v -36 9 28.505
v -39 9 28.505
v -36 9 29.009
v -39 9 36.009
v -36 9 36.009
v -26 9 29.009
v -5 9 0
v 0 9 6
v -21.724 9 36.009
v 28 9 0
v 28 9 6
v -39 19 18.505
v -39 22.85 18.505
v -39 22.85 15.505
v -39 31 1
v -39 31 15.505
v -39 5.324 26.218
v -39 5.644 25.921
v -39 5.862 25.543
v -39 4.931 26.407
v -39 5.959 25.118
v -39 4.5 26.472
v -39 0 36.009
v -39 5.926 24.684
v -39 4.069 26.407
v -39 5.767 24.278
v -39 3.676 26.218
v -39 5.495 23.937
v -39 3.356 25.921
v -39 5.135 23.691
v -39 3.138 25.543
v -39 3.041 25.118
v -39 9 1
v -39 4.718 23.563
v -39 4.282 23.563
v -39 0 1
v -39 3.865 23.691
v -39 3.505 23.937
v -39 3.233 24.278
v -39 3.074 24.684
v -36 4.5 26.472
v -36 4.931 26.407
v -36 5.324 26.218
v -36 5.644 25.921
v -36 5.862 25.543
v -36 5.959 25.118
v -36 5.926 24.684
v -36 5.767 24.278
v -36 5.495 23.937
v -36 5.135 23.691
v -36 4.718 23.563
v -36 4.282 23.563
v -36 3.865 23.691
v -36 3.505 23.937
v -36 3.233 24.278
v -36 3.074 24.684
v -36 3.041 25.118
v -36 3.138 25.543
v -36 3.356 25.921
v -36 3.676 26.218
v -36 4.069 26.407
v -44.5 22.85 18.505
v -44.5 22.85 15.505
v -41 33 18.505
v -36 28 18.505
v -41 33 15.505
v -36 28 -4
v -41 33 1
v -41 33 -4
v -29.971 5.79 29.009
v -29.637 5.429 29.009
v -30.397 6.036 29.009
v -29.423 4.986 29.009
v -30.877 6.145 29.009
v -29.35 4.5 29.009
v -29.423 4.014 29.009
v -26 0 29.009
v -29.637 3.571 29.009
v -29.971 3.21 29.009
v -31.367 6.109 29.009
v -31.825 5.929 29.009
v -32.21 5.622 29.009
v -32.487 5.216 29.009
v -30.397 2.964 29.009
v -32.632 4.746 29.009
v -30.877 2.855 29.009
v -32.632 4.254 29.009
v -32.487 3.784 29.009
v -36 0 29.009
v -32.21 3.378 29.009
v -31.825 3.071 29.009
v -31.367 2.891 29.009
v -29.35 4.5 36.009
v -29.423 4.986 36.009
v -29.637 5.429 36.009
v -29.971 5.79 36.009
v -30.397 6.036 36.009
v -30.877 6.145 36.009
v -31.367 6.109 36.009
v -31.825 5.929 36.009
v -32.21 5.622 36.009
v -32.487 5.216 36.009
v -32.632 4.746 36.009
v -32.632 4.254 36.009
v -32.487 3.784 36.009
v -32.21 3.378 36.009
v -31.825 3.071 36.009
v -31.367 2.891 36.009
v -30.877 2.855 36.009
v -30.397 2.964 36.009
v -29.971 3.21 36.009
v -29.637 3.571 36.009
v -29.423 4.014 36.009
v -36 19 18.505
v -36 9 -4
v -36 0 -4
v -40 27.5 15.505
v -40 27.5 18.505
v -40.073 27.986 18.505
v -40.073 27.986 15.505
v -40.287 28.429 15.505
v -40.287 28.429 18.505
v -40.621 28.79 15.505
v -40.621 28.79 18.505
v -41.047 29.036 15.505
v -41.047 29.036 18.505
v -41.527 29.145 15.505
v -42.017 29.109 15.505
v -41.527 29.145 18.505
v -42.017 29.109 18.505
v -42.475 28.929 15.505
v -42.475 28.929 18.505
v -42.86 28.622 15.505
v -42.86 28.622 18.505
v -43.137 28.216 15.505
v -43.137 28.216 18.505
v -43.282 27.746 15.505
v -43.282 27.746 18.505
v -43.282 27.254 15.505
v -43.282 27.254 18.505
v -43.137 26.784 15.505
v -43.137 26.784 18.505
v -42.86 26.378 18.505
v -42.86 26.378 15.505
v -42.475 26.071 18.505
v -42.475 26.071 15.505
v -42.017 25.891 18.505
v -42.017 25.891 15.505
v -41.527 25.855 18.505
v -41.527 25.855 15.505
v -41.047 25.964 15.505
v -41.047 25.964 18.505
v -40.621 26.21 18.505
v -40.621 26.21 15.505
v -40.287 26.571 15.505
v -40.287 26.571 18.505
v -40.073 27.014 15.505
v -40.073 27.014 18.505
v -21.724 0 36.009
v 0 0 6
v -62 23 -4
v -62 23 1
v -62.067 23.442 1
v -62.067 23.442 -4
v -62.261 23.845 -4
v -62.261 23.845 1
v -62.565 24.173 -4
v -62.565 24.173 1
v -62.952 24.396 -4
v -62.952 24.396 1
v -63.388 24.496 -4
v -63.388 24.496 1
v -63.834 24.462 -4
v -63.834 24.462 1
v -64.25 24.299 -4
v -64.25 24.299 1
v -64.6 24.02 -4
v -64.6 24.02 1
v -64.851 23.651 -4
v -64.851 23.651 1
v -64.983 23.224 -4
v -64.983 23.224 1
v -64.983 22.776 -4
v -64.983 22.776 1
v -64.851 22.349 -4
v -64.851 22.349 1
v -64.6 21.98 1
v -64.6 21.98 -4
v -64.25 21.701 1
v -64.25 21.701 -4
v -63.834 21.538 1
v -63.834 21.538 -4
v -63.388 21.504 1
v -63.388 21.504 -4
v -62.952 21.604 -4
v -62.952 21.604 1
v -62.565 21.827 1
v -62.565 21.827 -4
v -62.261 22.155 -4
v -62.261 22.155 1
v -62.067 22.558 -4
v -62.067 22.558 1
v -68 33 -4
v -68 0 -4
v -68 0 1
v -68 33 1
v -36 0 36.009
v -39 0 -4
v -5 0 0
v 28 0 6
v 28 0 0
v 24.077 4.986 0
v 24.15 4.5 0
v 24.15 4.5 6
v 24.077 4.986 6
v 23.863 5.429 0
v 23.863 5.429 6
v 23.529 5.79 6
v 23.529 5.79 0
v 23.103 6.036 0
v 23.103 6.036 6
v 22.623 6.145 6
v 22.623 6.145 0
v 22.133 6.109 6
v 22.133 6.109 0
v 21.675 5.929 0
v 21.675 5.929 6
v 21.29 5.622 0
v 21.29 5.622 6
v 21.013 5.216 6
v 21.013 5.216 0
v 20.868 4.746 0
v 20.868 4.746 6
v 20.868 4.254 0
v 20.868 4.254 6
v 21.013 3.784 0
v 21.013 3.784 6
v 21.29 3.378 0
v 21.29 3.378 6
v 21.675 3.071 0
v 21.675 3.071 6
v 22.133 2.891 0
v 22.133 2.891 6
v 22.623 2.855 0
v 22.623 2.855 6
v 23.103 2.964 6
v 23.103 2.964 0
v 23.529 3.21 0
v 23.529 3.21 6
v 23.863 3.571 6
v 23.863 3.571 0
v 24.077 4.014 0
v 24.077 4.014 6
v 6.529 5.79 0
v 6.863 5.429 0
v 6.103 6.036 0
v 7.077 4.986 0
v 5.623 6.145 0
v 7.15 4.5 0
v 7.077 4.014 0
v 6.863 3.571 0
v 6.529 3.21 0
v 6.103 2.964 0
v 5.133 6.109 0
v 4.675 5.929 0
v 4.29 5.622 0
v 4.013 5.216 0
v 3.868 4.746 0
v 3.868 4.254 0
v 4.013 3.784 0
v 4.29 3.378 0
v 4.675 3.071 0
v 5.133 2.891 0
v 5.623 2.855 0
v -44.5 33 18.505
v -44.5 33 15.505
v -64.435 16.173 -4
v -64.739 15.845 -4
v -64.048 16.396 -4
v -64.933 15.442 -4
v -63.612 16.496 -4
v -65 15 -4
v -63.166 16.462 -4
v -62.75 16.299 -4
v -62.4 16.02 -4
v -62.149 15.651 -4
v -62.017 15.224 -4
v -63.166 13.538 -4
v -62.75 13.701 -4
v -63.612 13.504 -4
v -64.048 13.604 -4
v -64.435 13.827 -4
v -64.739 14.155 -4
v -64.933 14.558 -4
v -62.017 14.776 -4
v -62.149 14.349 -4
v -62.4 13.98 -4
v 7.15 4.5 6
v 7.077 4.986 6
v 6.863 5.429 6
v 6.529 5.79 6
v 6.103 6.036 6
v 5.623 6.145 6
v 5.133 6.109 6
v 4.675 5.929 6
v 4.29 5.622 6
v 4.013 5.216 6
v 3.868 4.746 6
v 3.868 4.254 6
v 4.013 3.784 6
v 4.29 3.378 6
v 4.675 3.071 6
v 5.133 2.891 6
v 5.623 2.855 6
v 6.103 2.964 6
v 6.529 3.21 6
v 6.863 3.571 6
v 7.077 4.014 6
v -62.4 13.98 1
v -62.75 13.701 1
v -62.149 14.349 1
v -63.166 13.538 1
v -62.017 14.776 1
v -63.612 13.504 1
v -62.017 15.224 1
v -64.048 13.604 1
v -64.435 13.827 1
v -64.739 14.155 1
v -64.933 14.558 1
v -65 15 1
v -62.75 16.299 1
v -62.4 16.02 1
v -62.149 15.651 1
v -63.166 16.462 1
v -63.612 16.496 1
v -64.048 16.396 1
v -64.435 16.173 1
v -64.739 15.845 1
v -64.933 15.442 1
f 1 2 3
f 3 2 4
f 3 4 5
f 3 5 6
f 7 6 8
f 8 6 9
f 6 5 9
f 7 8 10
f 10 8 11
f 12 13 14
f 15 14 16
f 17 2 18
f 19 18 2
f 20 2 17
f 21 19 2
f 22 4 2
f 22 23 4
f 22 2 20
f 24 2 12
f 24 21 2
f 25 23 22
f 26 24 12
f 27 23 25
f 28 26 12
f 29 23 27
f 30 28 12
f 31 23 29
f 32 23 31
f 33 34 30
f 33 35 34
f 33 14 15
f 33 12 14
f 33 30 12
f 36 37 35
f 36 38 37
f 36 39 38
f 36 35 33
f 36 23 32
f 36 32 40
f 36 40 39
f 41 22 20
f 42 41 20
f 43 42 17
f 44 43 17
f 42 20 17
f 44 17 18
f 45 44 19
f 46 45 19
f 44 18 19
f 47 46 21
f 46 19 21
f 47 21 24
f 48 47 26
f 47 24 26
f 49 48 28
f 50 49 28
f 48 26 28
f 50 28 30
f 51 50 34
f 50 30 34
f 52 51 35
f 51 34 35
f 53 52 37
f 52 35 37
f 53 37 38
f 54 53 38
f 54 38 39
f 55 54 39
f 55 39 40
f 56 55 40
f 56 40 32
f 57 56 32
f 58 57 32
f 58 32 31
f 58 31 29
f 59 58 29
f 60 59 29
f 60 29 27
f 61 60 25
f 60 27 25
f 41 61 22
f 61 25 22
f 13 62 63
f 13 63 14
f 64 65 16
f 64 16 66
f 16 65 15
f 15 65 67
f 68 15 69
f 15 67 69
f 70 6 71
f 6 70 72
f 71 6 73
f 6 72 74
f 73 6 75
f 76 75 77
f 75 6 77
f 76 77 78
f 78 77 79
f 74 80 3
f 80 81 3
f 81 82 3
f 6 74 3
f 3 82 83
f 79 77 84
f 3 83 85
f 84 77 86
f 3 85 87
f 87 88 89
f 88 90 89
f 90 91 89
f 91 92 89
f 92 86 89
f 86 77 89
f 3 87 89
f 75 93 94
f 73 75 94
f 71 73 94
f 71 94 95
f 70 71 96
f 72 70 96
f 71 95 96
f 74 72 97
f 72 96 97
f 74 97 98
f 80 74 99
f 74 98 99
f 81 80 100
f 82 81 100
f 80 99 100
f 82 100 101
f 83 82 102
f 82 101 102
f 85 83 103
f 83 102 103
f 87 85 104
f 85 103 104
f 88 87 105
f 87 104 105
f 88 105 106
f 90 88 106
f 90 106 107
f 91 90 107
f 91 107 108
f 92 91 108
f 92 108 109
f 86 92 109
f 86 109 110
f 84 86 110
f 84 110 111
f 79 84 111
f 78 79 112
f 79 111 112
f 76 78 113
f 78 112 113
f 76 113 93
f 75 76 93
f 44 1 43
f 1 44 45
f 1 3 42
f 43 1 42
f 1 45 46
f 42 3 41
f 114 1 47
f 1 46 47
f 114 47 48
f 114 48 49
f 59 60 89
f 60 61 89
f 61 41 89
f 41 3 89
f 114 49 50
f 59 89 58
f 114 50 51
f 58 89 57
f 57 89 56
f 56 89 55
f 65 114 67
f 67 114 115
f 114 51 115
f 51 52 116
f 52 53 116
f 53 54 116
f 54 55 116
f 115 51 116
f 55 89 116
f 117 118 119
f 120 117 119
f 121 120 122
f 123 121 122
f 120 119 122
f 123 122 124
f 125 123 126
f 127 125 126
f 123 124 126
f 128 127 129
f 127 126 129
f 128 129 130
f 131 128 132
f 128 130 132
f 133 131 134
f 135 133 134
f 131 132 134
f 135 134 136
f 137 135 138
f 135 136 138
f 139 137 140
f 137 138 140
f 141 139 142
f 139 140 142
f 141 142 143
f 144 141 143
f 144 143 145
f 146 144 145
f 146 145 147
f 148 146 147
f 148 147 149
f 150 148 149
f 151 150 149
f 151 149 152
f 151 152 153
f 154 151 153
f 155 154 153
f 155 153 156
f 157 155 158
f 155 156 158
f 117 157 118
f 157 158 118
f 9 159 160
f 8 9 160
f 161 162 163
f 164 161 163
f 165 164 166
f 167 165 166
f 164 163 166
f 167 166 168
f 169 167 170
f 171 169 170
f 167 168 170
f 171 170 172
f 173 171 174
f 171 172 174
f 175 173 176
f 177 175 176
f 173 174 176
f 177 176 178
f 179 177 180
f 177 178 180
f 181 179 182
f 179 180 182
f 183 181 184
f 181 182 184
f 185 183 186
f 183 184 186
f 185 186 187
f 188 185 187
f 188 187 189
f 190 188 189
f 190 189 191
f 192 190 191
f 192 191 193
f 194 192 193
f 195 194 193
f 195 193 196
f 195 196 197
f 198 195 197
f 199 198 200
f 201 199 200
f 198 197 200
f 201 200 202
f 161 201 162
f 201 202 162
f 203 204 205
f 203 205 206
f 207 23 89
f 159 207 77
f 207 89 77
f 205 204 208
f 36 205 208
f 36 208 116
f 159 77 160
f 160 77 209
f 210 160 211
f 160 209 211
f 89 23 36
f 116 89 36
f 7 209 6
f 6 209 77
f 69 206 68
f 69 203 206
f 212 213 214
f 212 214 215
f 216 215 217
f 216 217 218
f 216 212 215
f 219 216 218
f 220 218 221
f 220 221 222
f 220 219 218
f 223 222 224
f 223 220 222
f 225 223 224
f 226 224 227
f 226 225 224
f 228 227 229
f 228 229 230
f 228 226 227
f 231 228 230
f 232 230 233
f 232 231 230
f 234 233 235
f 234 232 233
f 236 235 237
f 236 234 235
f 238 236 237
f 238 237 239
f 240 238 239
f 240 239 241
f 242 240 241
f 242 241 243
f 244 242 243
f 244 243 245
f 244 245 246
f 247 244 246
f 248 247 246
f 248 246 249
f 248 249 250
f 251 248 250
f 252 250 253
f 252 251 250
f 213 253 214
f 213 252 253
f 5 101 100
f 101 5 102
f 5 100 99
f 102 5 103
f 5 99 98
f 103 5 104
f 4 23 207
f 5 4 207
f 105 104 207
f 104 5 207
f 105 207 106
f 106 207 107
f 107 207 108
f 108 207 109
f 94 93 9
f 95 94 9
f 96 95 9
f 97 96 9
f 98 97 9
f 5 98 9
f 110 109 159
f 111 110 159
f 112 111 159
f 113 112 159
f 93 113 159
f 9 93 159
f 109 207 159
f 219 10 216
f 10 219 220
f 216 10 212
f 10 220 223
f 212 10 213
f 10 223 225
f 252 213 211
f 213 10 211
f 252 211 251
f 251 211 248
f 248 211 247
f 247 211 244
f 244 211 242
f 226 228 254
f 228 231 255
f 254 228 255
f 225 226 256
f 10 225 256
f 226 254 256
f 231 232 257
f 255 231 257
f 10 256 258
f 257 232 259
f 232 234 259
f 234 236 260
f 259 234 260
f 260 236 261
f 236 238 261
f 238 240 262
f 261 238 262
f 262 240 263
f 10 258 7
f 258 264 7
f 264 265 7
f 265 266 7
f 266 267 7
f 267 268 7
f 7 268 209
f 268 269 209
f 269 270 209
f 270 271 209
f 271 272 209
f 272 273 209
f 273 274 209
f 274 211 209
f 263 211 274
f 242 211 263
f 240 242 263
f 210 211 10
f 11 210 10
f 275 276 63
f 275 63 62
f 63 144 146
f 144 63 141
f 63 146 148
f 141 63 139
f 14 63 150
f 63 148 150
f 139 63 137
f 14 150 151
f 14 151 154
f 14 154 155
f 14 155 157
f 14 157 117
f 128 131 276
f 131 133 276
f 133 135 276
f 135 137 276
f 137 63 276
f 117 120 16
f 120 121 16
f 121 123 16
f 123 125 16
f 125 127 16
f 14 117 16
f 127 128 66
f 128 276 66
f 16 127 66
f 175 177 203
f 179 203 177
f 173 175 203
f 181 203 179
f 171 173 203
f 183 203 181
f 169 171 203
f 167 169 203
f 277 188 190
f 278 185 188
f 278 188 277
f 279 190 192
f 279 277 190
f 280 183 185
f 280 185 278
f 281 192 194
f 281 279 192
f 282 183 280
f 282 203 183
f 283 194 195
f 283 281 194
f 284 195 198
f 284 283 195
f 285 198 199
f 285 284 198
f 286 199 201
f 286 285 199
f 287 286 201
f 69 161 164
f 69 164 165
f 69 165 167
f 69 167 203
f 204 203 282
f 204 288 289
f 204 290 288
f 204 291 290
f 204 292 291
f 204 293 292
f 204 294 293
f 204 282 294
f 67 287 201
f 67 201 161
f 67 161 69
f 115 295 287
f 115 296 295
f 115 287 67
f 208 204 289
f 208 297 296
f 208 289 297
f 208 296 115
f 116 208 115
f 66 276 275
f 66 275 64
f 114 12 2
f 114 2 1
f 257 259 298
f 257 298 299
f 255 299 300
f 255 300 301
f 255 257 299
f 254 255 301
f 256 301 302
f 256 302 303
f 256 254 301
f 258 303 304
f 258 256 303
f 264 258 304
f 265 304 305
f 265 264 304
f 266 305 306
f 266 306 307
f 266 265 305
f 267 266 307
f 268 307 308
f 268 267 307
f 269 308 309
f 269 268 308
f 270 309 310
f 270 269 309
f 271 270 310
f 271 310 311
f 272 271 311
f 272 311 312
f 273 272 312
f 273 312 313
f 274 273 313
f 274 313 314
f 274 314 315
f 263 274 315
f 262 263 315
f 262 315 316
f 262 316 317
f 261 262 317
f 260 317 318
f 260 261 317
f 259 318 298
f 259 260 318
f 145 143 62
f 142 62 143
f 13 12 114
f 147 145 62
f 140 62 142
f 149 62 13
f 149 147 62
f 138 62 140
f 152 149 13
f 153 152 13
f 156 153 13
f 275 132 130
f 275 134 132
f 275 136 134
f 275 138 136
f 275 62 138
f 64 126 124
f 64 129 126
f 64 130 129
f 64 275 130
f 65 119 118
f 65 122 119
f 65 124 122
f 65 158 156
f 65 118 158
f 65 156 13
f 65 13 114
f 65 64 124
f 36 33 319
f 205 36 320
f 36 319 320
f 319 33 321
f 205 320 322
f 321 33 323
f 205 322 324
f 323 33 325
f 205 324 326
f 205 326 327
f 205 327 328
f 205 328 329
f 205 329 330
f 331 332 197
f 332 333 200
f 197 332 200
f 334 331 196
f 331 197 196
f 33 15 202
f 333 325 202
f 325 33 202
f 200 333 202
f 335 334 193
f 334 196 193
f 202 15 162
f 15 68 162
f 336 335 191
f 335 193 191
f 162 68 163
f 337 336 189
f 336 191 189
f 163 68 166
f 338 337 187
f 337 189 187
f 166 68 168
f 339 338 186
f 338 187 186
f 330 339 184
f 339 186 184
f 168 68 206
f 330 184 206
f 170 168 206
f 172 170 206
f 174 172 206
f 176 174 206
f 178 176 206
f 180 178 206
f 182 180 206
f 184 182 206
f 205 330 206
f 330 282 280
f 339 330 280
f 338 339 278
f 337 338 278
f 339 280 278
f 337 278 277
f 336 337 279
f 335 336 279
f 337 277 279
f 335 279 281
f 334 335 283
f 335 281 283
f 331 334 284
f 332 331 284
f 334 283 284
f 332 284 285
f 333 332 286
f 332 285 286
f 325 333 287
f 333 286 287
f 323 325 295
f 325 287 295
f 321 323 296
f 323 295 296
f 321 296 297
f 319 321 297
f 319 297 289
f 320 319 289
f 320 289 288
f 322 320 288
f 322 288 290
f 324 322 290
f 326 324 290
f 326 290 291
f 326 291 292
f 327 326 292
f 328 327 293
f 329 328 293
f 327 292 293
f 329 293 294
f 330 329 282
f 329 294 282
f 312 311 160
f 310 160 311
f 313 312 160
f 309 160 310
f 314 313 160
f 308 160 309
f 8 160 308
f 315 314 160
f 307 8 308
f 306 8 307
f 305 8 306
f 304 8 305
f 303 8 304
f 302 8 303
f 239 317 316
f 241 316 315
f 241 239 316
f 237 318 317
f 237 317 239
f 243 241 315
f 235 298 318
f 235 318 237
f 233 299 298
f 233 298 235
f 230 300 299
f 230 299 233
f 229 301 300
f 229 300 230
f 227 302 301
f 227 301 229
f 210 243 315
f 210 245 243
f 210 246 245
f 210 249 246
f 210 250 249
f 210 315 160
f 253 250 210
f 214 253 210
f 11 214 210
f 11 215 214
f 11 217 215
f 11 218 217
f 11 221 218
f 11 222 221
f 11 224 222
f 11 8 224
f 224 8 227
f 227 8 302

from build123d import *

# Parameters (mm, degrees)
SZKIC1_W                    = 28
SZKIC1_H                    = 9
SZKIC1_R                    = 1.65
DODANIE_WYCI_GNI_CIE1_DEPTH = 6
DODANIE_WYCI_GNI_CIE2_DEPTH = 9
SZKIC3_W                    = 3
SZKIC3_H                    = 40.009031977
DODANIE_WYCI_GNI_CIE3_DEPTH = 9
SZKIC10_R                   = 1.65
WYTNIJ_WYCI_GNI_CIE4_DEPTH  = 7
SZKIC11_W                   = 32
SZKIC11_H                   = 33
SZKIC11_R                   = 1.5
DODANIE_WYCI_GNI_CIE4_DEPTH = 5
SZKIC12_W                   = 3
SZKIC12_H                   = 17.504515989
DODANIE_WYCI_GNI_CIE5_DEPTH = 24
SZKIC13_W                   = 10
SZKIC13_H                   = 3
DODANIE_WYCI_GNI_CIE6_DEPTH = 33
SZKIC14_R                   = 1.65
WYTNIJ_WYCI_GNI_CIE5_DEPTH  = 3
SZKIC15_W                   = 7
SZKIC15_H                   = 22.85
WYTNIJ_WYCI_GNI_CIE6_DEPTH  = 3
SFAZOWANIE1_SIZE            = 10
SZKIC16_R                   = 1.5
WYTNIJ_WYCI_GNI_CIE7_DEPTH  = 5
SZKIC17_R                   = 1.46285789
WYTNIJ_WYCI_GNI_CIE8_DEPTH  = 3
SZKIC18_W                   = 3
SZKIC18_H                   = 10.15
WYTNIJ_WYCI_GNI_CIE9_DEPTH  = 1.5
WYTNIJ_WYCI_GNI_CIE10_REACH = 87.52


with BuildPart() as part:
    # Szkic1 → Dodanie-wyciągnięcie1 (new body)
    with BuildSketch(Plane.XY):
        with Locations((14, 4.5)):
            Rectangle(SZKIC1_W, SZKIC1_H)
        with Locations((5.5, 4.5)):
            Circle(SZKIC1_R, mode=Mode.SUBTRACT)
        with Locations((22.5, 4.5)):
            Circle(SZKIC1_R, mode=Mode.SUBTRACT)
    extrude(amount=DODANIE_WYCI_GNI_CIE1_DEPTH)

    # Szkic2 → Dodanie-wyciągnięcie2 (add)
    with BuildSketch(Plane.XZ):
        Polygon((0, 0), (-5, 0), (-26, 29.009031977), (-36, 29.009031977), (-36, 36.009031977), (-21.72391247, 36.009031977), (0, 6), align=None)
    extrude(amount=-DODANIE_WYCI_GNI_CIE2_DEPTH)

    # Szkic3 → Dodanie-wyciągnięcie3 (add)
    with BuildSketch(Plane.XZ):
        with Locations((-37.5, 16.004515988)):
            Rectangle(SZKIC3_W, SZKIC3_H)
    extrude(amount=-DODANIE_WYCI_GNI_CIE3_DEPTH)

    # Szkic10 → Wytnij-wyciągnięcie4 (cut)
    with BuildSketch(Plane.XY.offset(36.009031977)):
        with Locations((-31, 4.5)):
            Circle(SZKIC10_R)
    extrude(amount=-WYTNIJ_WYCI_GNI_CIE4_DEPTH, mode=Mode.SUBTRACT)

    # Szkic11 → Dodanie-wyciągnięcie4 (add)
    with BuildSketch(Plane(origin=(0, 0, -4), x_dir=(-1, 0, 0), z_dir=(0, 0, -1))):
        with Locations((52, 16.5)):
            Rectangle(SZKIC11_W, SZKIC11_H)
        with Locations((63.5, 15)):
            Circle(SZKIC11_R, mode=Mode.SUBTRACT)
    extrude(amount=-DODANIE_WYCI_GNI_CIE4_DEPTH)

    # Szkic12 → Dodanie-wyciągnięcie5 (add)
    with BuildSketch(Plane(origin=(0, 9, 0), x_dir=(1, 0, 0), z_dir=(0, 1, 0))):
        with Locations((-37.5, -9.752257995)):
            Rectangle(SZKIC12_W, SZKIC12_H)
    extrude(amount=DODANIE_WYCI_GNI_CIE5_DEPTH)

    # Szkic13 → Dodanie-wyciągnięcie6 (add)
    with BuildSketch(Plane(origin=(0, 33, 0), x_dir=(1, 0, 0), z_dir=(0, 1, 0))):
        with Locations((-41, -17.004515989)):
            Rectangle(SZKIC13_W, SZKIC13_H)
    extrude(amount=-DODANIE_WYCI_GNI_CIE6_DEPTH)

    # Szkic14 → Wytnij-wyciągnięcie5 (cut)
    with BuildSketch(Plane.XY.offset(18.504515989)):
        with Locations((-41.65, 27.5)):
            Circle(SZKIC14_R)
    extrude(amount=-WYTNIJ_WYCI_GNI_CIE5_DEPTH, mode=Mode.SUBTRACT)

    # Szkic15 → Wytnij-wyciągnięcie6 (cut)
    with BuildSketch(Plane.XY.offset(18.504515989)):
        with Locations((-42.5, 11.425)):
            Rectangle(SZKIC15_W, SZKIC15_H)
    extrude(amount=-WYTNIJ_WYCI_GNI_CIE6_DEPTH, mode=Mode.SUBTRACT)

    # Sfazowanie1
    sfazowanie1_edges = [part.edges().sort_by_distance(p)[0] for p in [
        (-37.5, 9, 18.504515989),
    ]]
    chamfer(sfazowanie1_edges, length=SFAZOWANIE1_SIZE)

    # Szkic16 → Wytnij-wyciągnięcie7 (cut)
    with BuildSketch(Plane.XY.offset(1)):
        with Locations((-63.5, 23)):
            Circle(SZKIC16_R)
    extrude(amount=-WYTNIJ_WYCI_GNI_CIE7_DEPTH, mode=Mode.SUBTRACT)

    # Szkic17 → Wytnij-wyciągnięcie8 (cut)
    with BuildSketch(Plane.ZY.offset(39)):
        with Locations((25.009031977, 4.5)):
            Circle(SZKIC17_R)
    extrude(amount=-WYTNIJ_WYCI_GNI_CIE8_DEPTH, mode=Mode.SUBTRACT)

    # Szkic18 → Wytnij-wyciągnięcie9 (cut)
    with BuildSketch(Plane.ZY.offset(46)):
        with Locations((17.004515989, 27.925)):
            Rectangle(SZKIC18_W, SZKIC18_H)
    extrude(amount=-WYTNIJ_WYCI_GNI_CIE9_DEPTH, mode=Mode.SUBTRACT)

    # Wytnij-wyciągnięcie10: up to this face of the body (flat: up to its plane)
    wytnij_wyci_gni_cie10_end = Plane(part.part.faces().sort_by_distance((-39.760074004, 27.060059494, 18.504515989))[0])
    # Szkic19 → Wytnij-wyciągnięcie10 (cut, up to the picked face)
    with BuildSketch(Plane(origin=(0, 0, -4), x_dir=(-1, 0, 0), z_dir=(0, 0, -1)), mode=Mode.PRIVATE) as wytnij_wyci_gni_cie10_sk1:
        Polygon((36, 28), (41, 33), (36, 33), align=None)
    wytnij_wyci_gni_cie10_tool1 = split(extrude(wytnij_wyci_gni_cie10_sk1.sketch, amount=-WYTNIJ_WYCI_GNI_CIE10_REACH, mode=Mode.PRIVATE), bisect_by=wytnij_wyci_gni_cie10_end, keep=Keep.BOTH, mode=Mode.PRIVATE)
    add(wytnij_wyci_gni_cie10_tool1.solids().sort_by(Axis((-37.666667, 31.333333, -4), (0, 0, 1)))[0], mode=Mode.SUBTRACT)


solid = part.part
